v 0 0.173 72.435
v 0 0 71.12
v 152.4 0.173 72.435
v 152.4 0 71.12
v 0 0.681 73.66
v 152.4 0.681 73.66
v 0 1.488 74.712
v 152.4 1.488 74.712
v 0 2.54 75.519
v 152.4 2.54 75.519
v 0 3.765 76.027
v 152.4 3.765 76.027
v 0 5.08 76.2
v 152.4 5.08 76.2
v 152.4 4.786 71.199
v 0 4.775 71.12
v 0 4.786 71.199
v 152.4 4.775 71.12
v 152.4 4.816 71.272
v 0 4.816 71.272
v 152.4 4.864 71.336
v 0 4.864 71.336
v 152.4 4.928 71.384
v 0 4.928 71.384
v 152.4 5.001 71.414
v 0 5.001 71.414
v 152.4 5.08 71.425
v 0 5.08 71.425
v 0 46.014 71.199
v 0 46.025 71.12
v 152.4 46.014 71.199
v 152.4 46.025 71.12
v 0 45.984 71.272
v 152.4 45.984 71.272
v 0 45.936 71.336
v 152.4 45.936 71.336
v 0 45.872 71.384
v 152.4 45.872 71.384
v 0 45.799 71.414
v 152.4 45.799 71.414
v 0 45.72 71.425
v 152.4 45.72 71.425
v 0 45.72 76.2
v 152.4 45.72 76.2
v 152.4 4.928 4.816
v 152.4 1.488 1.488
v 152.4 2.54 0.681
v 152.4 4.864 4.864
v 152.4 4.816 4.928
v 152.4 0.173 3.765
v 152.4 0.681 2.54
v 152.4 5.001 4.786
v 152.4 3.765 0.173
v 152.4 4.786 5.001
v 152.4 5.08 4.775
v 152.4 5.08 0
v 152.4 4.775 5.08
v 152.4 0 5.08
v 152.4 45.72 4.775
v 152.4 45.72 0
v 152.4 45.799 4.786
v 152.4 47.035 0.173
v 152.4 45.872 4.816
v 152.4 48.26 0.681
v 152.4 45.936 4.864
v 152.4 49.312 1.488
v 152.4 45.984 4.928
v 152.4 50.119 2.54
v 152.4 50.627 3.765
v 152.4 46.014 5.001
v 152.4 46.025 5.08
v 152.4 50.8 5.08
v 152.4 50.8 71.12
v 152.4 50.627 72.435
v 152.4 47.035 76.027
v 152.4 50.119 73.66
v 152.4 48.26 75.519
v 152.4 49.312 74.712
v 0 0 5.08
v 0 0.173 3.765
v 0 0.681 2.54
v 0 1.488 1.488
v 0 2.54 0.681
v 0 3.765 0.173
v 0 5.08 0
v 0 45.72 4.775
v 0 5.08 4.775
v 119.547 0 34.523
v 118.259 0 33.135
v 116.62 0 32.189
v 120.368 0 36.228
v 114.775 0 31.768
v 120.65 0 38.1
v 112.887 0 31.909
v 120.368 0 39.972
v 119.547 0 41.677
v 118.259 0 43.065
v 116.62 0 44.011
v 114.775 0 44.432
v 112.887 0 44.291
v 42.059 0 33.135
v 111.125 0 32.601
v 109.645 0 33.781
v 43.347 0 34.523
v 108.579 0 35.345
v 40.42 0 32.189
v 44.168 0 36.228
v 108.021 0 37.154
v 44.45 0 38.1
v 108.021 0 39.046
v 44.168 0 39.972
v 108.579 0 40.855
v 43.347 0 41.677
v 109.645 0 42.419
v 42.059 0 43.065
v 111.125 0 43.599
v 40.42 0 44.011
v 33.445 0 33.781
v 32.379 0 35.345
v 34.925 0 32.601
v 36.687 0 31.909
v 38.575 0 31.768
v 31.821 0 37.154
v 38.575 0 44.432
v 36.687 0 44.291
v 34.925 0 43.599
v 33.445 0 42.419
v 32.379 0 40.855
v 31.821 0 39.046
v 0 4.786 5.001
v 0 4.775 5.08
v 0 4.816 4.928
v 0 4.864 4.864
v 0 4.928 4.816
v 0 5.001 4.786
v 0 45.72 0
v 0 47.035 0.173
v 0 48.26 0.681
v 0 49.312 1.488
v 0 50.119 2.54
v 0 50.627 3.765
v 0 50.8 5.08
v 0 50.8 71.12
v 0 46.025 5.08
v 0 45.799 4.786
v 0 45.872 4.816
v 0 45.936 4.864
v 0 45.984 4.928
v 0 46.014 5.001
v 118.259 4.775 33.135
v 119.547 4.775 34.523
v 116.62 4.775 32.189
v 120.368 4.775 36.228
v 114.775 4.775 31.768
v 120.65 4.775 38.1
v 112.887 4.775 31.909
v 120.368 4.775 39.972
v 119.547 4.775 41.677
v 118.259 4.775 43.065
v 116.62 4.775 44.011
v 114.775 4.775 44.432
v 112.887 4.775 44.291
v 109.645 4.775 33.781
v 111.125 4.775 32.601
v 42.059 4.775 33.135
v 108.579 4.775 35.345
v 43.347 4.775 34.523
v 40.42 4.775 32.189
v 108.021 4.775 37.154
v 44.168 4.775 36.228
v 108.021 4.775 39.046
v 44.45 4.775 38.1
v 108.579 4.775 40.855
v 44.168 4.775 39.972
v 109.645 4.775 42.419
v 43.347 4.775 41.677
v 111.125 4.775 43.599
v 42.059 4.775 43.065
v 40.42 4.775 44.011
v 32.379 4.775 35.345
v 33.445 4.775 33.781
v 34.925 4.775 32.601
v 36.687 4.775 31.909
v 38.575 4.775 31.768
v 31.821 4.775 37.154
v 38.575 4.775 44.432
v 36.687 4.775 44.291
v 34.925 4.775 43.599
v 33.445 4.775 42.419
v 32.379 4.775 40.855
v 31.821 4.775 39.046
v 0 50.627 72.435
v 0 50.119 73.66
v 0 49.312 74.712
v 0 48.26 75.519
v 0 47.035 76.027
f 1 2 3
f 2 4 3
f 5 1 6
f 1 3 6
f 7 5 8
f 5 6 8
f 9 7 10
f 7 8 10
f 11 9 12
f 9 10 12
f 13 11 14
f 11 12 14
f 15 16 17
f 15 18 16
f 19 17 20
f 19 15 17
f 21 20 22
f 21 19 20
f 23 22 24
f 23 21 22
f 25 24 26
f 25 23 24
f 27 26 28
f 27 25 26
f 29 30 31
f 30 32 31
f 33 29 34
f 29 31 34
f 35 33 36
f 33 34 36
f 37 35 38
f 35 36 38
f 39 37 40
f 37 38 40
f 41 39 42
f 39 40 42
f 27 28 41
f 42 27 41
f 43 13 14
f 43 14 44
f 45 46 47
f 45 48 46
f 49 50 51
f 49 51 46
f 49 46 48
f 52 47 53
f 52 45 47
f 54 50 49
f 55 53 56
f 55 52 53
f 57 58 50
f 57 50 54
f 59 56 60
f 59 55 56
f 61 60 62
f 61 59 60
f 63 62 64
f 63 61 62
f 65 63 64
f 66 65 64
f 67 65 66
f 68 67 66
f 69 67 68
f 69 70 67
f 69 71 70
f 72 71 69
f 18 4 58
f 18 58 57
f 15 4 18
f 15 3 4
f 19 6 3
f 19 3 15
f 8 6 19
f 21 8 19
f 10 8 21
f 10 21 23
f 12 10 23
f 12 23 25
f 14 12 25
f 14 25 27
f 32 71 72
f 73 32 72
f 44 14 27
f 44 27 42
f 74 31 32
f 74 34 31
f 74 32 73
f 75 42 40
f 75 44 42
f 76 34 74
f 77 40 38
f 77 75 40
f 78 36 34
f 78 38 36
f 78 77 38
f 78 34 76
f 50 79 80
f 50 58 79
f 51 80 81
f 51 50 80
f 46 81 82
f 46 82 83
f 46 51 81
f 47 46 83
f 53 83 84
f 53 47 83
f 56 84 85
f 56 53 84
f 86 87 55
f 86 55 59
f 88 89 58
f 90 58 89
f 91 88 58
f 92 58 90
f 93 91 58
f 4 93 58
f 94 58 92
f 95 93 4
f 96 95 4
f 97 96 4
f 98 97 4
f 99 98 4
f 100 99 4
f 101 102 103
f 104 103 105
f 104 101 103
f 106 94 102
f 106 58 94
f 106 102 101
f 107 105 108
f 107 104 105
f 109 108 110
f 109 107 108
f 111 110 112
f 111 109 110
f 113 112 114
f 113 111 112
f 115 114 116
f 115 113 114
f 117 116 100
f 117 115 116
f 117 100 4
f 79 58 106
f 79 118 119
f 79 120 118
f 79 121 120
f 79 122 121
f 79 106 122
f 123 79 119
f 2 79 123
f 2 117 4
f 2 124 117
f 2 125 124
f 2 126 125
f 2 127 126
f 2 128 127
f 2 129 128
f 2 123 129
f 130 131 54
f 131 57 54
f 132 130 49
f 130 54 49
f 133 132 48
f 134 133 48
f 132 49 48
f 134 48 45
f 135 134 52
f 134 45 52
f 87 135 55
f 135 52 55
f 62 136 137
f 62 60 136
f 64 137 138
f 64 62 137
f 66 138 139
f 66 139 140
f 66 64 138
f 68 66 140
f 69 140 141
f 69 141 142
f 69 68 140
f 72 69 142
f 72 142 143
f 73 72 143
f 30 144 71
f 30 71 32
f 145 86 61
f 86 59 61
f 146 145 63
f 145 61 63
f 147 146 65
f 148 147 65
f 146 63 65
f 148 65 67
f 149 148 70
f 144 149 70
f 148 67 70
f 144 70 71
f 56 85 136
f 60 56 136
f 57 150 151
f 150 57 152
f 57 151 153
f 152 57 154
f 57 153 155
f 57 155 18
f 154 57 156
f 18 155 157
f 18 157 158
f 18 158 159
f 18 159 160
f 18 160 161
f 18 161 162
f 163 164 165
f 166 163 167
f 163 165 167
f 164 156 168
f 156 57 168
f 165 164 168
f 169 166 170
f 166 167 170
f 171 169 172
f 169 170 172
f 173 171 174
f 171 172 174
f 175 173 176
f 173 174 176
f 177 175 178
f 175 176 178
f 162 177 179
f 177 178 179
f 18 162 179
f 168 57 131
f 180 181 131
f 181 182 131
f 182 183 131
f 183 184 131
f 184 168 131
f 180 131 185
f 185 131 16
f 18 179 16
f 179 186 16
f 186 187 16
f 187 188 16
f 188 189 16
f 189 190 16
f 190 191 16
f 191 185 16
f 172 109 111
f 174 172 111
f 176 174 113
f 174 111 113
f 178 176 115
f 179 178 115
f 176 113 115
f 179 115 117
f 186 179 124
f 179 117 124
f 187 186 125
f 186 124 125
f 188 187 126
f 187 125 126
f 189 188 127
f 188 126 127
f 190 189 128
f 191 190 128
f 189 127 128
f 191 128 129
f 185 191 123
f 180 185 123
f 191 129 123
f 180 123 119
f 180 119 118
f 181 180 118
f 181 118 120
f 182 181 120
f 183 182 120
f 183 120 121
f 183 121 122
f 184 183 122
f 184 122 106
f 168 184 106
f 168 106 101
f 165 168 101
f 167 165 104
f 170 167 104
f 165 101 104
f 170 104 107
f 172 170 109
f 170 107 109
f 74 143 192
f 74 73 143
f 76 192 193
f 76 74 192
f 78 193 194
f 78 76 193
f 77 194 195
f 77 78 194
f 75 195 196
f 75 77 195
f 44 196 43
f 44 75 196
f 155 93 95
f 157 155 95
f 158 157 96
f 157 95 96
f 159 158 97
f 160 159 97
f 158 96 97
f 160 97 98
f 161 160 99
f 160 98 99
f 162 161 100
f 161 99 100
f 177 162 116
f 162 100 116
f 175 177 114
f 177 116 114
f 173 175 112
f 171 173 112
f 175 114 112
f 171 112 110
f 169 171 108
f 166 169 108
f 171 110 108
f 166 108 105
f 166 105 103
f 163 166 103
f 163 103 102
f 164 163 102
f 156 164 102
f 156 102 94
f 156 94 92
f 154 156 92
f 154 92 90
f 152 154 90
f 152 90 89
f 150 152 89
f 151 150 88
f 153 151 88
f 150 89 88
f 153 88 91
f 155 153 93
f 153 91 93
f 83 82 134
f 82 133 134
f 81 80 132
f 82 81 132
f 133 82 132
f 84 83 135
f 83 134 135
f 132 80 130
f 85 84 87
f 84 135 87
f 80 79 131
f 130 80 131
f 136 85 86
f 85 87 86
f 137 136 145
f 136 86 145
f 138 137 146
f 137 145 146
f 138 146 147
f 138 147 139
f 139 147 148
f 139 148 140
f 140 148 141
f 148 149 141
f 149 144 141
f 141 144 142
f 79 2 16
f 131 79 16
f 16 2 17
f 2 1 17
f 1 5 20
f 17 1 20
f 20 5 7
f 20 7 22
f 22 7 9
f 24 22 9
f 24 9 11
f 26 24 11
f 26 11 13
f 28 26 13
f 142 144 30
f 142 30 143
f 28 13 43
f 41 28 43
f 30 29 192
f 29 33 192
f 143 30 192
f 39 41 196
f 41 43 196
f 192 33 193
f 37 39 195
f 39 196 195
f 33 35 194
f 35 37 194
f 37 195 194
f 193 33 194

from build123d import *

# Parameters (mm, degrees)
F0_W     = 50.8
F0_H     = 76.2
F1_DEPTH = 152.4
F2_R     = 5.08
F3_T     = -4.7752
F4_R     = 6.35
F5_DEPTH = 4.7752


with BuildPart() as f1:
    # F0 (on Right) → F1 (new body)
    with BuildSketch(Plane.YZ):
        with Locations((25.4, 38.1)):
            Rectangle(F0_W, F0_H)
    extrude(amount=F1_DEPTH)

    # F2
    f2_edges = [f1.edges().sort_by_distance(p)[0] for p in [
        (76.2, 0, 76.2),
        (76.2, 50.8, 76.2),
        (76.2, 0, 0),
        (76.2, 50.8, 0),
    ]]
    fillet(f2_edges, radius=F2_R)

    # F3
    f3_openings = [f1.faces().sort_by_distance(p)[0] for p in [
        (152.4, 25.4, 38.1),
        (0, 25.4, 38.1),
    ]]
    offset(amount=F3_T, openings=f3_openings)

    # F4 (on face) → F5 (cut, through all)
    with BuildSketch(Plane.XZ):
        with Locations((38.1, 38.1)):
            Circle(F4_R)
        with Locations((114.3, 38.1)):
            Circle(F4_R)
    extrude(amount=-F5_DEPTH, mode=Mode.SUBTRACT)


solid = f1.part
